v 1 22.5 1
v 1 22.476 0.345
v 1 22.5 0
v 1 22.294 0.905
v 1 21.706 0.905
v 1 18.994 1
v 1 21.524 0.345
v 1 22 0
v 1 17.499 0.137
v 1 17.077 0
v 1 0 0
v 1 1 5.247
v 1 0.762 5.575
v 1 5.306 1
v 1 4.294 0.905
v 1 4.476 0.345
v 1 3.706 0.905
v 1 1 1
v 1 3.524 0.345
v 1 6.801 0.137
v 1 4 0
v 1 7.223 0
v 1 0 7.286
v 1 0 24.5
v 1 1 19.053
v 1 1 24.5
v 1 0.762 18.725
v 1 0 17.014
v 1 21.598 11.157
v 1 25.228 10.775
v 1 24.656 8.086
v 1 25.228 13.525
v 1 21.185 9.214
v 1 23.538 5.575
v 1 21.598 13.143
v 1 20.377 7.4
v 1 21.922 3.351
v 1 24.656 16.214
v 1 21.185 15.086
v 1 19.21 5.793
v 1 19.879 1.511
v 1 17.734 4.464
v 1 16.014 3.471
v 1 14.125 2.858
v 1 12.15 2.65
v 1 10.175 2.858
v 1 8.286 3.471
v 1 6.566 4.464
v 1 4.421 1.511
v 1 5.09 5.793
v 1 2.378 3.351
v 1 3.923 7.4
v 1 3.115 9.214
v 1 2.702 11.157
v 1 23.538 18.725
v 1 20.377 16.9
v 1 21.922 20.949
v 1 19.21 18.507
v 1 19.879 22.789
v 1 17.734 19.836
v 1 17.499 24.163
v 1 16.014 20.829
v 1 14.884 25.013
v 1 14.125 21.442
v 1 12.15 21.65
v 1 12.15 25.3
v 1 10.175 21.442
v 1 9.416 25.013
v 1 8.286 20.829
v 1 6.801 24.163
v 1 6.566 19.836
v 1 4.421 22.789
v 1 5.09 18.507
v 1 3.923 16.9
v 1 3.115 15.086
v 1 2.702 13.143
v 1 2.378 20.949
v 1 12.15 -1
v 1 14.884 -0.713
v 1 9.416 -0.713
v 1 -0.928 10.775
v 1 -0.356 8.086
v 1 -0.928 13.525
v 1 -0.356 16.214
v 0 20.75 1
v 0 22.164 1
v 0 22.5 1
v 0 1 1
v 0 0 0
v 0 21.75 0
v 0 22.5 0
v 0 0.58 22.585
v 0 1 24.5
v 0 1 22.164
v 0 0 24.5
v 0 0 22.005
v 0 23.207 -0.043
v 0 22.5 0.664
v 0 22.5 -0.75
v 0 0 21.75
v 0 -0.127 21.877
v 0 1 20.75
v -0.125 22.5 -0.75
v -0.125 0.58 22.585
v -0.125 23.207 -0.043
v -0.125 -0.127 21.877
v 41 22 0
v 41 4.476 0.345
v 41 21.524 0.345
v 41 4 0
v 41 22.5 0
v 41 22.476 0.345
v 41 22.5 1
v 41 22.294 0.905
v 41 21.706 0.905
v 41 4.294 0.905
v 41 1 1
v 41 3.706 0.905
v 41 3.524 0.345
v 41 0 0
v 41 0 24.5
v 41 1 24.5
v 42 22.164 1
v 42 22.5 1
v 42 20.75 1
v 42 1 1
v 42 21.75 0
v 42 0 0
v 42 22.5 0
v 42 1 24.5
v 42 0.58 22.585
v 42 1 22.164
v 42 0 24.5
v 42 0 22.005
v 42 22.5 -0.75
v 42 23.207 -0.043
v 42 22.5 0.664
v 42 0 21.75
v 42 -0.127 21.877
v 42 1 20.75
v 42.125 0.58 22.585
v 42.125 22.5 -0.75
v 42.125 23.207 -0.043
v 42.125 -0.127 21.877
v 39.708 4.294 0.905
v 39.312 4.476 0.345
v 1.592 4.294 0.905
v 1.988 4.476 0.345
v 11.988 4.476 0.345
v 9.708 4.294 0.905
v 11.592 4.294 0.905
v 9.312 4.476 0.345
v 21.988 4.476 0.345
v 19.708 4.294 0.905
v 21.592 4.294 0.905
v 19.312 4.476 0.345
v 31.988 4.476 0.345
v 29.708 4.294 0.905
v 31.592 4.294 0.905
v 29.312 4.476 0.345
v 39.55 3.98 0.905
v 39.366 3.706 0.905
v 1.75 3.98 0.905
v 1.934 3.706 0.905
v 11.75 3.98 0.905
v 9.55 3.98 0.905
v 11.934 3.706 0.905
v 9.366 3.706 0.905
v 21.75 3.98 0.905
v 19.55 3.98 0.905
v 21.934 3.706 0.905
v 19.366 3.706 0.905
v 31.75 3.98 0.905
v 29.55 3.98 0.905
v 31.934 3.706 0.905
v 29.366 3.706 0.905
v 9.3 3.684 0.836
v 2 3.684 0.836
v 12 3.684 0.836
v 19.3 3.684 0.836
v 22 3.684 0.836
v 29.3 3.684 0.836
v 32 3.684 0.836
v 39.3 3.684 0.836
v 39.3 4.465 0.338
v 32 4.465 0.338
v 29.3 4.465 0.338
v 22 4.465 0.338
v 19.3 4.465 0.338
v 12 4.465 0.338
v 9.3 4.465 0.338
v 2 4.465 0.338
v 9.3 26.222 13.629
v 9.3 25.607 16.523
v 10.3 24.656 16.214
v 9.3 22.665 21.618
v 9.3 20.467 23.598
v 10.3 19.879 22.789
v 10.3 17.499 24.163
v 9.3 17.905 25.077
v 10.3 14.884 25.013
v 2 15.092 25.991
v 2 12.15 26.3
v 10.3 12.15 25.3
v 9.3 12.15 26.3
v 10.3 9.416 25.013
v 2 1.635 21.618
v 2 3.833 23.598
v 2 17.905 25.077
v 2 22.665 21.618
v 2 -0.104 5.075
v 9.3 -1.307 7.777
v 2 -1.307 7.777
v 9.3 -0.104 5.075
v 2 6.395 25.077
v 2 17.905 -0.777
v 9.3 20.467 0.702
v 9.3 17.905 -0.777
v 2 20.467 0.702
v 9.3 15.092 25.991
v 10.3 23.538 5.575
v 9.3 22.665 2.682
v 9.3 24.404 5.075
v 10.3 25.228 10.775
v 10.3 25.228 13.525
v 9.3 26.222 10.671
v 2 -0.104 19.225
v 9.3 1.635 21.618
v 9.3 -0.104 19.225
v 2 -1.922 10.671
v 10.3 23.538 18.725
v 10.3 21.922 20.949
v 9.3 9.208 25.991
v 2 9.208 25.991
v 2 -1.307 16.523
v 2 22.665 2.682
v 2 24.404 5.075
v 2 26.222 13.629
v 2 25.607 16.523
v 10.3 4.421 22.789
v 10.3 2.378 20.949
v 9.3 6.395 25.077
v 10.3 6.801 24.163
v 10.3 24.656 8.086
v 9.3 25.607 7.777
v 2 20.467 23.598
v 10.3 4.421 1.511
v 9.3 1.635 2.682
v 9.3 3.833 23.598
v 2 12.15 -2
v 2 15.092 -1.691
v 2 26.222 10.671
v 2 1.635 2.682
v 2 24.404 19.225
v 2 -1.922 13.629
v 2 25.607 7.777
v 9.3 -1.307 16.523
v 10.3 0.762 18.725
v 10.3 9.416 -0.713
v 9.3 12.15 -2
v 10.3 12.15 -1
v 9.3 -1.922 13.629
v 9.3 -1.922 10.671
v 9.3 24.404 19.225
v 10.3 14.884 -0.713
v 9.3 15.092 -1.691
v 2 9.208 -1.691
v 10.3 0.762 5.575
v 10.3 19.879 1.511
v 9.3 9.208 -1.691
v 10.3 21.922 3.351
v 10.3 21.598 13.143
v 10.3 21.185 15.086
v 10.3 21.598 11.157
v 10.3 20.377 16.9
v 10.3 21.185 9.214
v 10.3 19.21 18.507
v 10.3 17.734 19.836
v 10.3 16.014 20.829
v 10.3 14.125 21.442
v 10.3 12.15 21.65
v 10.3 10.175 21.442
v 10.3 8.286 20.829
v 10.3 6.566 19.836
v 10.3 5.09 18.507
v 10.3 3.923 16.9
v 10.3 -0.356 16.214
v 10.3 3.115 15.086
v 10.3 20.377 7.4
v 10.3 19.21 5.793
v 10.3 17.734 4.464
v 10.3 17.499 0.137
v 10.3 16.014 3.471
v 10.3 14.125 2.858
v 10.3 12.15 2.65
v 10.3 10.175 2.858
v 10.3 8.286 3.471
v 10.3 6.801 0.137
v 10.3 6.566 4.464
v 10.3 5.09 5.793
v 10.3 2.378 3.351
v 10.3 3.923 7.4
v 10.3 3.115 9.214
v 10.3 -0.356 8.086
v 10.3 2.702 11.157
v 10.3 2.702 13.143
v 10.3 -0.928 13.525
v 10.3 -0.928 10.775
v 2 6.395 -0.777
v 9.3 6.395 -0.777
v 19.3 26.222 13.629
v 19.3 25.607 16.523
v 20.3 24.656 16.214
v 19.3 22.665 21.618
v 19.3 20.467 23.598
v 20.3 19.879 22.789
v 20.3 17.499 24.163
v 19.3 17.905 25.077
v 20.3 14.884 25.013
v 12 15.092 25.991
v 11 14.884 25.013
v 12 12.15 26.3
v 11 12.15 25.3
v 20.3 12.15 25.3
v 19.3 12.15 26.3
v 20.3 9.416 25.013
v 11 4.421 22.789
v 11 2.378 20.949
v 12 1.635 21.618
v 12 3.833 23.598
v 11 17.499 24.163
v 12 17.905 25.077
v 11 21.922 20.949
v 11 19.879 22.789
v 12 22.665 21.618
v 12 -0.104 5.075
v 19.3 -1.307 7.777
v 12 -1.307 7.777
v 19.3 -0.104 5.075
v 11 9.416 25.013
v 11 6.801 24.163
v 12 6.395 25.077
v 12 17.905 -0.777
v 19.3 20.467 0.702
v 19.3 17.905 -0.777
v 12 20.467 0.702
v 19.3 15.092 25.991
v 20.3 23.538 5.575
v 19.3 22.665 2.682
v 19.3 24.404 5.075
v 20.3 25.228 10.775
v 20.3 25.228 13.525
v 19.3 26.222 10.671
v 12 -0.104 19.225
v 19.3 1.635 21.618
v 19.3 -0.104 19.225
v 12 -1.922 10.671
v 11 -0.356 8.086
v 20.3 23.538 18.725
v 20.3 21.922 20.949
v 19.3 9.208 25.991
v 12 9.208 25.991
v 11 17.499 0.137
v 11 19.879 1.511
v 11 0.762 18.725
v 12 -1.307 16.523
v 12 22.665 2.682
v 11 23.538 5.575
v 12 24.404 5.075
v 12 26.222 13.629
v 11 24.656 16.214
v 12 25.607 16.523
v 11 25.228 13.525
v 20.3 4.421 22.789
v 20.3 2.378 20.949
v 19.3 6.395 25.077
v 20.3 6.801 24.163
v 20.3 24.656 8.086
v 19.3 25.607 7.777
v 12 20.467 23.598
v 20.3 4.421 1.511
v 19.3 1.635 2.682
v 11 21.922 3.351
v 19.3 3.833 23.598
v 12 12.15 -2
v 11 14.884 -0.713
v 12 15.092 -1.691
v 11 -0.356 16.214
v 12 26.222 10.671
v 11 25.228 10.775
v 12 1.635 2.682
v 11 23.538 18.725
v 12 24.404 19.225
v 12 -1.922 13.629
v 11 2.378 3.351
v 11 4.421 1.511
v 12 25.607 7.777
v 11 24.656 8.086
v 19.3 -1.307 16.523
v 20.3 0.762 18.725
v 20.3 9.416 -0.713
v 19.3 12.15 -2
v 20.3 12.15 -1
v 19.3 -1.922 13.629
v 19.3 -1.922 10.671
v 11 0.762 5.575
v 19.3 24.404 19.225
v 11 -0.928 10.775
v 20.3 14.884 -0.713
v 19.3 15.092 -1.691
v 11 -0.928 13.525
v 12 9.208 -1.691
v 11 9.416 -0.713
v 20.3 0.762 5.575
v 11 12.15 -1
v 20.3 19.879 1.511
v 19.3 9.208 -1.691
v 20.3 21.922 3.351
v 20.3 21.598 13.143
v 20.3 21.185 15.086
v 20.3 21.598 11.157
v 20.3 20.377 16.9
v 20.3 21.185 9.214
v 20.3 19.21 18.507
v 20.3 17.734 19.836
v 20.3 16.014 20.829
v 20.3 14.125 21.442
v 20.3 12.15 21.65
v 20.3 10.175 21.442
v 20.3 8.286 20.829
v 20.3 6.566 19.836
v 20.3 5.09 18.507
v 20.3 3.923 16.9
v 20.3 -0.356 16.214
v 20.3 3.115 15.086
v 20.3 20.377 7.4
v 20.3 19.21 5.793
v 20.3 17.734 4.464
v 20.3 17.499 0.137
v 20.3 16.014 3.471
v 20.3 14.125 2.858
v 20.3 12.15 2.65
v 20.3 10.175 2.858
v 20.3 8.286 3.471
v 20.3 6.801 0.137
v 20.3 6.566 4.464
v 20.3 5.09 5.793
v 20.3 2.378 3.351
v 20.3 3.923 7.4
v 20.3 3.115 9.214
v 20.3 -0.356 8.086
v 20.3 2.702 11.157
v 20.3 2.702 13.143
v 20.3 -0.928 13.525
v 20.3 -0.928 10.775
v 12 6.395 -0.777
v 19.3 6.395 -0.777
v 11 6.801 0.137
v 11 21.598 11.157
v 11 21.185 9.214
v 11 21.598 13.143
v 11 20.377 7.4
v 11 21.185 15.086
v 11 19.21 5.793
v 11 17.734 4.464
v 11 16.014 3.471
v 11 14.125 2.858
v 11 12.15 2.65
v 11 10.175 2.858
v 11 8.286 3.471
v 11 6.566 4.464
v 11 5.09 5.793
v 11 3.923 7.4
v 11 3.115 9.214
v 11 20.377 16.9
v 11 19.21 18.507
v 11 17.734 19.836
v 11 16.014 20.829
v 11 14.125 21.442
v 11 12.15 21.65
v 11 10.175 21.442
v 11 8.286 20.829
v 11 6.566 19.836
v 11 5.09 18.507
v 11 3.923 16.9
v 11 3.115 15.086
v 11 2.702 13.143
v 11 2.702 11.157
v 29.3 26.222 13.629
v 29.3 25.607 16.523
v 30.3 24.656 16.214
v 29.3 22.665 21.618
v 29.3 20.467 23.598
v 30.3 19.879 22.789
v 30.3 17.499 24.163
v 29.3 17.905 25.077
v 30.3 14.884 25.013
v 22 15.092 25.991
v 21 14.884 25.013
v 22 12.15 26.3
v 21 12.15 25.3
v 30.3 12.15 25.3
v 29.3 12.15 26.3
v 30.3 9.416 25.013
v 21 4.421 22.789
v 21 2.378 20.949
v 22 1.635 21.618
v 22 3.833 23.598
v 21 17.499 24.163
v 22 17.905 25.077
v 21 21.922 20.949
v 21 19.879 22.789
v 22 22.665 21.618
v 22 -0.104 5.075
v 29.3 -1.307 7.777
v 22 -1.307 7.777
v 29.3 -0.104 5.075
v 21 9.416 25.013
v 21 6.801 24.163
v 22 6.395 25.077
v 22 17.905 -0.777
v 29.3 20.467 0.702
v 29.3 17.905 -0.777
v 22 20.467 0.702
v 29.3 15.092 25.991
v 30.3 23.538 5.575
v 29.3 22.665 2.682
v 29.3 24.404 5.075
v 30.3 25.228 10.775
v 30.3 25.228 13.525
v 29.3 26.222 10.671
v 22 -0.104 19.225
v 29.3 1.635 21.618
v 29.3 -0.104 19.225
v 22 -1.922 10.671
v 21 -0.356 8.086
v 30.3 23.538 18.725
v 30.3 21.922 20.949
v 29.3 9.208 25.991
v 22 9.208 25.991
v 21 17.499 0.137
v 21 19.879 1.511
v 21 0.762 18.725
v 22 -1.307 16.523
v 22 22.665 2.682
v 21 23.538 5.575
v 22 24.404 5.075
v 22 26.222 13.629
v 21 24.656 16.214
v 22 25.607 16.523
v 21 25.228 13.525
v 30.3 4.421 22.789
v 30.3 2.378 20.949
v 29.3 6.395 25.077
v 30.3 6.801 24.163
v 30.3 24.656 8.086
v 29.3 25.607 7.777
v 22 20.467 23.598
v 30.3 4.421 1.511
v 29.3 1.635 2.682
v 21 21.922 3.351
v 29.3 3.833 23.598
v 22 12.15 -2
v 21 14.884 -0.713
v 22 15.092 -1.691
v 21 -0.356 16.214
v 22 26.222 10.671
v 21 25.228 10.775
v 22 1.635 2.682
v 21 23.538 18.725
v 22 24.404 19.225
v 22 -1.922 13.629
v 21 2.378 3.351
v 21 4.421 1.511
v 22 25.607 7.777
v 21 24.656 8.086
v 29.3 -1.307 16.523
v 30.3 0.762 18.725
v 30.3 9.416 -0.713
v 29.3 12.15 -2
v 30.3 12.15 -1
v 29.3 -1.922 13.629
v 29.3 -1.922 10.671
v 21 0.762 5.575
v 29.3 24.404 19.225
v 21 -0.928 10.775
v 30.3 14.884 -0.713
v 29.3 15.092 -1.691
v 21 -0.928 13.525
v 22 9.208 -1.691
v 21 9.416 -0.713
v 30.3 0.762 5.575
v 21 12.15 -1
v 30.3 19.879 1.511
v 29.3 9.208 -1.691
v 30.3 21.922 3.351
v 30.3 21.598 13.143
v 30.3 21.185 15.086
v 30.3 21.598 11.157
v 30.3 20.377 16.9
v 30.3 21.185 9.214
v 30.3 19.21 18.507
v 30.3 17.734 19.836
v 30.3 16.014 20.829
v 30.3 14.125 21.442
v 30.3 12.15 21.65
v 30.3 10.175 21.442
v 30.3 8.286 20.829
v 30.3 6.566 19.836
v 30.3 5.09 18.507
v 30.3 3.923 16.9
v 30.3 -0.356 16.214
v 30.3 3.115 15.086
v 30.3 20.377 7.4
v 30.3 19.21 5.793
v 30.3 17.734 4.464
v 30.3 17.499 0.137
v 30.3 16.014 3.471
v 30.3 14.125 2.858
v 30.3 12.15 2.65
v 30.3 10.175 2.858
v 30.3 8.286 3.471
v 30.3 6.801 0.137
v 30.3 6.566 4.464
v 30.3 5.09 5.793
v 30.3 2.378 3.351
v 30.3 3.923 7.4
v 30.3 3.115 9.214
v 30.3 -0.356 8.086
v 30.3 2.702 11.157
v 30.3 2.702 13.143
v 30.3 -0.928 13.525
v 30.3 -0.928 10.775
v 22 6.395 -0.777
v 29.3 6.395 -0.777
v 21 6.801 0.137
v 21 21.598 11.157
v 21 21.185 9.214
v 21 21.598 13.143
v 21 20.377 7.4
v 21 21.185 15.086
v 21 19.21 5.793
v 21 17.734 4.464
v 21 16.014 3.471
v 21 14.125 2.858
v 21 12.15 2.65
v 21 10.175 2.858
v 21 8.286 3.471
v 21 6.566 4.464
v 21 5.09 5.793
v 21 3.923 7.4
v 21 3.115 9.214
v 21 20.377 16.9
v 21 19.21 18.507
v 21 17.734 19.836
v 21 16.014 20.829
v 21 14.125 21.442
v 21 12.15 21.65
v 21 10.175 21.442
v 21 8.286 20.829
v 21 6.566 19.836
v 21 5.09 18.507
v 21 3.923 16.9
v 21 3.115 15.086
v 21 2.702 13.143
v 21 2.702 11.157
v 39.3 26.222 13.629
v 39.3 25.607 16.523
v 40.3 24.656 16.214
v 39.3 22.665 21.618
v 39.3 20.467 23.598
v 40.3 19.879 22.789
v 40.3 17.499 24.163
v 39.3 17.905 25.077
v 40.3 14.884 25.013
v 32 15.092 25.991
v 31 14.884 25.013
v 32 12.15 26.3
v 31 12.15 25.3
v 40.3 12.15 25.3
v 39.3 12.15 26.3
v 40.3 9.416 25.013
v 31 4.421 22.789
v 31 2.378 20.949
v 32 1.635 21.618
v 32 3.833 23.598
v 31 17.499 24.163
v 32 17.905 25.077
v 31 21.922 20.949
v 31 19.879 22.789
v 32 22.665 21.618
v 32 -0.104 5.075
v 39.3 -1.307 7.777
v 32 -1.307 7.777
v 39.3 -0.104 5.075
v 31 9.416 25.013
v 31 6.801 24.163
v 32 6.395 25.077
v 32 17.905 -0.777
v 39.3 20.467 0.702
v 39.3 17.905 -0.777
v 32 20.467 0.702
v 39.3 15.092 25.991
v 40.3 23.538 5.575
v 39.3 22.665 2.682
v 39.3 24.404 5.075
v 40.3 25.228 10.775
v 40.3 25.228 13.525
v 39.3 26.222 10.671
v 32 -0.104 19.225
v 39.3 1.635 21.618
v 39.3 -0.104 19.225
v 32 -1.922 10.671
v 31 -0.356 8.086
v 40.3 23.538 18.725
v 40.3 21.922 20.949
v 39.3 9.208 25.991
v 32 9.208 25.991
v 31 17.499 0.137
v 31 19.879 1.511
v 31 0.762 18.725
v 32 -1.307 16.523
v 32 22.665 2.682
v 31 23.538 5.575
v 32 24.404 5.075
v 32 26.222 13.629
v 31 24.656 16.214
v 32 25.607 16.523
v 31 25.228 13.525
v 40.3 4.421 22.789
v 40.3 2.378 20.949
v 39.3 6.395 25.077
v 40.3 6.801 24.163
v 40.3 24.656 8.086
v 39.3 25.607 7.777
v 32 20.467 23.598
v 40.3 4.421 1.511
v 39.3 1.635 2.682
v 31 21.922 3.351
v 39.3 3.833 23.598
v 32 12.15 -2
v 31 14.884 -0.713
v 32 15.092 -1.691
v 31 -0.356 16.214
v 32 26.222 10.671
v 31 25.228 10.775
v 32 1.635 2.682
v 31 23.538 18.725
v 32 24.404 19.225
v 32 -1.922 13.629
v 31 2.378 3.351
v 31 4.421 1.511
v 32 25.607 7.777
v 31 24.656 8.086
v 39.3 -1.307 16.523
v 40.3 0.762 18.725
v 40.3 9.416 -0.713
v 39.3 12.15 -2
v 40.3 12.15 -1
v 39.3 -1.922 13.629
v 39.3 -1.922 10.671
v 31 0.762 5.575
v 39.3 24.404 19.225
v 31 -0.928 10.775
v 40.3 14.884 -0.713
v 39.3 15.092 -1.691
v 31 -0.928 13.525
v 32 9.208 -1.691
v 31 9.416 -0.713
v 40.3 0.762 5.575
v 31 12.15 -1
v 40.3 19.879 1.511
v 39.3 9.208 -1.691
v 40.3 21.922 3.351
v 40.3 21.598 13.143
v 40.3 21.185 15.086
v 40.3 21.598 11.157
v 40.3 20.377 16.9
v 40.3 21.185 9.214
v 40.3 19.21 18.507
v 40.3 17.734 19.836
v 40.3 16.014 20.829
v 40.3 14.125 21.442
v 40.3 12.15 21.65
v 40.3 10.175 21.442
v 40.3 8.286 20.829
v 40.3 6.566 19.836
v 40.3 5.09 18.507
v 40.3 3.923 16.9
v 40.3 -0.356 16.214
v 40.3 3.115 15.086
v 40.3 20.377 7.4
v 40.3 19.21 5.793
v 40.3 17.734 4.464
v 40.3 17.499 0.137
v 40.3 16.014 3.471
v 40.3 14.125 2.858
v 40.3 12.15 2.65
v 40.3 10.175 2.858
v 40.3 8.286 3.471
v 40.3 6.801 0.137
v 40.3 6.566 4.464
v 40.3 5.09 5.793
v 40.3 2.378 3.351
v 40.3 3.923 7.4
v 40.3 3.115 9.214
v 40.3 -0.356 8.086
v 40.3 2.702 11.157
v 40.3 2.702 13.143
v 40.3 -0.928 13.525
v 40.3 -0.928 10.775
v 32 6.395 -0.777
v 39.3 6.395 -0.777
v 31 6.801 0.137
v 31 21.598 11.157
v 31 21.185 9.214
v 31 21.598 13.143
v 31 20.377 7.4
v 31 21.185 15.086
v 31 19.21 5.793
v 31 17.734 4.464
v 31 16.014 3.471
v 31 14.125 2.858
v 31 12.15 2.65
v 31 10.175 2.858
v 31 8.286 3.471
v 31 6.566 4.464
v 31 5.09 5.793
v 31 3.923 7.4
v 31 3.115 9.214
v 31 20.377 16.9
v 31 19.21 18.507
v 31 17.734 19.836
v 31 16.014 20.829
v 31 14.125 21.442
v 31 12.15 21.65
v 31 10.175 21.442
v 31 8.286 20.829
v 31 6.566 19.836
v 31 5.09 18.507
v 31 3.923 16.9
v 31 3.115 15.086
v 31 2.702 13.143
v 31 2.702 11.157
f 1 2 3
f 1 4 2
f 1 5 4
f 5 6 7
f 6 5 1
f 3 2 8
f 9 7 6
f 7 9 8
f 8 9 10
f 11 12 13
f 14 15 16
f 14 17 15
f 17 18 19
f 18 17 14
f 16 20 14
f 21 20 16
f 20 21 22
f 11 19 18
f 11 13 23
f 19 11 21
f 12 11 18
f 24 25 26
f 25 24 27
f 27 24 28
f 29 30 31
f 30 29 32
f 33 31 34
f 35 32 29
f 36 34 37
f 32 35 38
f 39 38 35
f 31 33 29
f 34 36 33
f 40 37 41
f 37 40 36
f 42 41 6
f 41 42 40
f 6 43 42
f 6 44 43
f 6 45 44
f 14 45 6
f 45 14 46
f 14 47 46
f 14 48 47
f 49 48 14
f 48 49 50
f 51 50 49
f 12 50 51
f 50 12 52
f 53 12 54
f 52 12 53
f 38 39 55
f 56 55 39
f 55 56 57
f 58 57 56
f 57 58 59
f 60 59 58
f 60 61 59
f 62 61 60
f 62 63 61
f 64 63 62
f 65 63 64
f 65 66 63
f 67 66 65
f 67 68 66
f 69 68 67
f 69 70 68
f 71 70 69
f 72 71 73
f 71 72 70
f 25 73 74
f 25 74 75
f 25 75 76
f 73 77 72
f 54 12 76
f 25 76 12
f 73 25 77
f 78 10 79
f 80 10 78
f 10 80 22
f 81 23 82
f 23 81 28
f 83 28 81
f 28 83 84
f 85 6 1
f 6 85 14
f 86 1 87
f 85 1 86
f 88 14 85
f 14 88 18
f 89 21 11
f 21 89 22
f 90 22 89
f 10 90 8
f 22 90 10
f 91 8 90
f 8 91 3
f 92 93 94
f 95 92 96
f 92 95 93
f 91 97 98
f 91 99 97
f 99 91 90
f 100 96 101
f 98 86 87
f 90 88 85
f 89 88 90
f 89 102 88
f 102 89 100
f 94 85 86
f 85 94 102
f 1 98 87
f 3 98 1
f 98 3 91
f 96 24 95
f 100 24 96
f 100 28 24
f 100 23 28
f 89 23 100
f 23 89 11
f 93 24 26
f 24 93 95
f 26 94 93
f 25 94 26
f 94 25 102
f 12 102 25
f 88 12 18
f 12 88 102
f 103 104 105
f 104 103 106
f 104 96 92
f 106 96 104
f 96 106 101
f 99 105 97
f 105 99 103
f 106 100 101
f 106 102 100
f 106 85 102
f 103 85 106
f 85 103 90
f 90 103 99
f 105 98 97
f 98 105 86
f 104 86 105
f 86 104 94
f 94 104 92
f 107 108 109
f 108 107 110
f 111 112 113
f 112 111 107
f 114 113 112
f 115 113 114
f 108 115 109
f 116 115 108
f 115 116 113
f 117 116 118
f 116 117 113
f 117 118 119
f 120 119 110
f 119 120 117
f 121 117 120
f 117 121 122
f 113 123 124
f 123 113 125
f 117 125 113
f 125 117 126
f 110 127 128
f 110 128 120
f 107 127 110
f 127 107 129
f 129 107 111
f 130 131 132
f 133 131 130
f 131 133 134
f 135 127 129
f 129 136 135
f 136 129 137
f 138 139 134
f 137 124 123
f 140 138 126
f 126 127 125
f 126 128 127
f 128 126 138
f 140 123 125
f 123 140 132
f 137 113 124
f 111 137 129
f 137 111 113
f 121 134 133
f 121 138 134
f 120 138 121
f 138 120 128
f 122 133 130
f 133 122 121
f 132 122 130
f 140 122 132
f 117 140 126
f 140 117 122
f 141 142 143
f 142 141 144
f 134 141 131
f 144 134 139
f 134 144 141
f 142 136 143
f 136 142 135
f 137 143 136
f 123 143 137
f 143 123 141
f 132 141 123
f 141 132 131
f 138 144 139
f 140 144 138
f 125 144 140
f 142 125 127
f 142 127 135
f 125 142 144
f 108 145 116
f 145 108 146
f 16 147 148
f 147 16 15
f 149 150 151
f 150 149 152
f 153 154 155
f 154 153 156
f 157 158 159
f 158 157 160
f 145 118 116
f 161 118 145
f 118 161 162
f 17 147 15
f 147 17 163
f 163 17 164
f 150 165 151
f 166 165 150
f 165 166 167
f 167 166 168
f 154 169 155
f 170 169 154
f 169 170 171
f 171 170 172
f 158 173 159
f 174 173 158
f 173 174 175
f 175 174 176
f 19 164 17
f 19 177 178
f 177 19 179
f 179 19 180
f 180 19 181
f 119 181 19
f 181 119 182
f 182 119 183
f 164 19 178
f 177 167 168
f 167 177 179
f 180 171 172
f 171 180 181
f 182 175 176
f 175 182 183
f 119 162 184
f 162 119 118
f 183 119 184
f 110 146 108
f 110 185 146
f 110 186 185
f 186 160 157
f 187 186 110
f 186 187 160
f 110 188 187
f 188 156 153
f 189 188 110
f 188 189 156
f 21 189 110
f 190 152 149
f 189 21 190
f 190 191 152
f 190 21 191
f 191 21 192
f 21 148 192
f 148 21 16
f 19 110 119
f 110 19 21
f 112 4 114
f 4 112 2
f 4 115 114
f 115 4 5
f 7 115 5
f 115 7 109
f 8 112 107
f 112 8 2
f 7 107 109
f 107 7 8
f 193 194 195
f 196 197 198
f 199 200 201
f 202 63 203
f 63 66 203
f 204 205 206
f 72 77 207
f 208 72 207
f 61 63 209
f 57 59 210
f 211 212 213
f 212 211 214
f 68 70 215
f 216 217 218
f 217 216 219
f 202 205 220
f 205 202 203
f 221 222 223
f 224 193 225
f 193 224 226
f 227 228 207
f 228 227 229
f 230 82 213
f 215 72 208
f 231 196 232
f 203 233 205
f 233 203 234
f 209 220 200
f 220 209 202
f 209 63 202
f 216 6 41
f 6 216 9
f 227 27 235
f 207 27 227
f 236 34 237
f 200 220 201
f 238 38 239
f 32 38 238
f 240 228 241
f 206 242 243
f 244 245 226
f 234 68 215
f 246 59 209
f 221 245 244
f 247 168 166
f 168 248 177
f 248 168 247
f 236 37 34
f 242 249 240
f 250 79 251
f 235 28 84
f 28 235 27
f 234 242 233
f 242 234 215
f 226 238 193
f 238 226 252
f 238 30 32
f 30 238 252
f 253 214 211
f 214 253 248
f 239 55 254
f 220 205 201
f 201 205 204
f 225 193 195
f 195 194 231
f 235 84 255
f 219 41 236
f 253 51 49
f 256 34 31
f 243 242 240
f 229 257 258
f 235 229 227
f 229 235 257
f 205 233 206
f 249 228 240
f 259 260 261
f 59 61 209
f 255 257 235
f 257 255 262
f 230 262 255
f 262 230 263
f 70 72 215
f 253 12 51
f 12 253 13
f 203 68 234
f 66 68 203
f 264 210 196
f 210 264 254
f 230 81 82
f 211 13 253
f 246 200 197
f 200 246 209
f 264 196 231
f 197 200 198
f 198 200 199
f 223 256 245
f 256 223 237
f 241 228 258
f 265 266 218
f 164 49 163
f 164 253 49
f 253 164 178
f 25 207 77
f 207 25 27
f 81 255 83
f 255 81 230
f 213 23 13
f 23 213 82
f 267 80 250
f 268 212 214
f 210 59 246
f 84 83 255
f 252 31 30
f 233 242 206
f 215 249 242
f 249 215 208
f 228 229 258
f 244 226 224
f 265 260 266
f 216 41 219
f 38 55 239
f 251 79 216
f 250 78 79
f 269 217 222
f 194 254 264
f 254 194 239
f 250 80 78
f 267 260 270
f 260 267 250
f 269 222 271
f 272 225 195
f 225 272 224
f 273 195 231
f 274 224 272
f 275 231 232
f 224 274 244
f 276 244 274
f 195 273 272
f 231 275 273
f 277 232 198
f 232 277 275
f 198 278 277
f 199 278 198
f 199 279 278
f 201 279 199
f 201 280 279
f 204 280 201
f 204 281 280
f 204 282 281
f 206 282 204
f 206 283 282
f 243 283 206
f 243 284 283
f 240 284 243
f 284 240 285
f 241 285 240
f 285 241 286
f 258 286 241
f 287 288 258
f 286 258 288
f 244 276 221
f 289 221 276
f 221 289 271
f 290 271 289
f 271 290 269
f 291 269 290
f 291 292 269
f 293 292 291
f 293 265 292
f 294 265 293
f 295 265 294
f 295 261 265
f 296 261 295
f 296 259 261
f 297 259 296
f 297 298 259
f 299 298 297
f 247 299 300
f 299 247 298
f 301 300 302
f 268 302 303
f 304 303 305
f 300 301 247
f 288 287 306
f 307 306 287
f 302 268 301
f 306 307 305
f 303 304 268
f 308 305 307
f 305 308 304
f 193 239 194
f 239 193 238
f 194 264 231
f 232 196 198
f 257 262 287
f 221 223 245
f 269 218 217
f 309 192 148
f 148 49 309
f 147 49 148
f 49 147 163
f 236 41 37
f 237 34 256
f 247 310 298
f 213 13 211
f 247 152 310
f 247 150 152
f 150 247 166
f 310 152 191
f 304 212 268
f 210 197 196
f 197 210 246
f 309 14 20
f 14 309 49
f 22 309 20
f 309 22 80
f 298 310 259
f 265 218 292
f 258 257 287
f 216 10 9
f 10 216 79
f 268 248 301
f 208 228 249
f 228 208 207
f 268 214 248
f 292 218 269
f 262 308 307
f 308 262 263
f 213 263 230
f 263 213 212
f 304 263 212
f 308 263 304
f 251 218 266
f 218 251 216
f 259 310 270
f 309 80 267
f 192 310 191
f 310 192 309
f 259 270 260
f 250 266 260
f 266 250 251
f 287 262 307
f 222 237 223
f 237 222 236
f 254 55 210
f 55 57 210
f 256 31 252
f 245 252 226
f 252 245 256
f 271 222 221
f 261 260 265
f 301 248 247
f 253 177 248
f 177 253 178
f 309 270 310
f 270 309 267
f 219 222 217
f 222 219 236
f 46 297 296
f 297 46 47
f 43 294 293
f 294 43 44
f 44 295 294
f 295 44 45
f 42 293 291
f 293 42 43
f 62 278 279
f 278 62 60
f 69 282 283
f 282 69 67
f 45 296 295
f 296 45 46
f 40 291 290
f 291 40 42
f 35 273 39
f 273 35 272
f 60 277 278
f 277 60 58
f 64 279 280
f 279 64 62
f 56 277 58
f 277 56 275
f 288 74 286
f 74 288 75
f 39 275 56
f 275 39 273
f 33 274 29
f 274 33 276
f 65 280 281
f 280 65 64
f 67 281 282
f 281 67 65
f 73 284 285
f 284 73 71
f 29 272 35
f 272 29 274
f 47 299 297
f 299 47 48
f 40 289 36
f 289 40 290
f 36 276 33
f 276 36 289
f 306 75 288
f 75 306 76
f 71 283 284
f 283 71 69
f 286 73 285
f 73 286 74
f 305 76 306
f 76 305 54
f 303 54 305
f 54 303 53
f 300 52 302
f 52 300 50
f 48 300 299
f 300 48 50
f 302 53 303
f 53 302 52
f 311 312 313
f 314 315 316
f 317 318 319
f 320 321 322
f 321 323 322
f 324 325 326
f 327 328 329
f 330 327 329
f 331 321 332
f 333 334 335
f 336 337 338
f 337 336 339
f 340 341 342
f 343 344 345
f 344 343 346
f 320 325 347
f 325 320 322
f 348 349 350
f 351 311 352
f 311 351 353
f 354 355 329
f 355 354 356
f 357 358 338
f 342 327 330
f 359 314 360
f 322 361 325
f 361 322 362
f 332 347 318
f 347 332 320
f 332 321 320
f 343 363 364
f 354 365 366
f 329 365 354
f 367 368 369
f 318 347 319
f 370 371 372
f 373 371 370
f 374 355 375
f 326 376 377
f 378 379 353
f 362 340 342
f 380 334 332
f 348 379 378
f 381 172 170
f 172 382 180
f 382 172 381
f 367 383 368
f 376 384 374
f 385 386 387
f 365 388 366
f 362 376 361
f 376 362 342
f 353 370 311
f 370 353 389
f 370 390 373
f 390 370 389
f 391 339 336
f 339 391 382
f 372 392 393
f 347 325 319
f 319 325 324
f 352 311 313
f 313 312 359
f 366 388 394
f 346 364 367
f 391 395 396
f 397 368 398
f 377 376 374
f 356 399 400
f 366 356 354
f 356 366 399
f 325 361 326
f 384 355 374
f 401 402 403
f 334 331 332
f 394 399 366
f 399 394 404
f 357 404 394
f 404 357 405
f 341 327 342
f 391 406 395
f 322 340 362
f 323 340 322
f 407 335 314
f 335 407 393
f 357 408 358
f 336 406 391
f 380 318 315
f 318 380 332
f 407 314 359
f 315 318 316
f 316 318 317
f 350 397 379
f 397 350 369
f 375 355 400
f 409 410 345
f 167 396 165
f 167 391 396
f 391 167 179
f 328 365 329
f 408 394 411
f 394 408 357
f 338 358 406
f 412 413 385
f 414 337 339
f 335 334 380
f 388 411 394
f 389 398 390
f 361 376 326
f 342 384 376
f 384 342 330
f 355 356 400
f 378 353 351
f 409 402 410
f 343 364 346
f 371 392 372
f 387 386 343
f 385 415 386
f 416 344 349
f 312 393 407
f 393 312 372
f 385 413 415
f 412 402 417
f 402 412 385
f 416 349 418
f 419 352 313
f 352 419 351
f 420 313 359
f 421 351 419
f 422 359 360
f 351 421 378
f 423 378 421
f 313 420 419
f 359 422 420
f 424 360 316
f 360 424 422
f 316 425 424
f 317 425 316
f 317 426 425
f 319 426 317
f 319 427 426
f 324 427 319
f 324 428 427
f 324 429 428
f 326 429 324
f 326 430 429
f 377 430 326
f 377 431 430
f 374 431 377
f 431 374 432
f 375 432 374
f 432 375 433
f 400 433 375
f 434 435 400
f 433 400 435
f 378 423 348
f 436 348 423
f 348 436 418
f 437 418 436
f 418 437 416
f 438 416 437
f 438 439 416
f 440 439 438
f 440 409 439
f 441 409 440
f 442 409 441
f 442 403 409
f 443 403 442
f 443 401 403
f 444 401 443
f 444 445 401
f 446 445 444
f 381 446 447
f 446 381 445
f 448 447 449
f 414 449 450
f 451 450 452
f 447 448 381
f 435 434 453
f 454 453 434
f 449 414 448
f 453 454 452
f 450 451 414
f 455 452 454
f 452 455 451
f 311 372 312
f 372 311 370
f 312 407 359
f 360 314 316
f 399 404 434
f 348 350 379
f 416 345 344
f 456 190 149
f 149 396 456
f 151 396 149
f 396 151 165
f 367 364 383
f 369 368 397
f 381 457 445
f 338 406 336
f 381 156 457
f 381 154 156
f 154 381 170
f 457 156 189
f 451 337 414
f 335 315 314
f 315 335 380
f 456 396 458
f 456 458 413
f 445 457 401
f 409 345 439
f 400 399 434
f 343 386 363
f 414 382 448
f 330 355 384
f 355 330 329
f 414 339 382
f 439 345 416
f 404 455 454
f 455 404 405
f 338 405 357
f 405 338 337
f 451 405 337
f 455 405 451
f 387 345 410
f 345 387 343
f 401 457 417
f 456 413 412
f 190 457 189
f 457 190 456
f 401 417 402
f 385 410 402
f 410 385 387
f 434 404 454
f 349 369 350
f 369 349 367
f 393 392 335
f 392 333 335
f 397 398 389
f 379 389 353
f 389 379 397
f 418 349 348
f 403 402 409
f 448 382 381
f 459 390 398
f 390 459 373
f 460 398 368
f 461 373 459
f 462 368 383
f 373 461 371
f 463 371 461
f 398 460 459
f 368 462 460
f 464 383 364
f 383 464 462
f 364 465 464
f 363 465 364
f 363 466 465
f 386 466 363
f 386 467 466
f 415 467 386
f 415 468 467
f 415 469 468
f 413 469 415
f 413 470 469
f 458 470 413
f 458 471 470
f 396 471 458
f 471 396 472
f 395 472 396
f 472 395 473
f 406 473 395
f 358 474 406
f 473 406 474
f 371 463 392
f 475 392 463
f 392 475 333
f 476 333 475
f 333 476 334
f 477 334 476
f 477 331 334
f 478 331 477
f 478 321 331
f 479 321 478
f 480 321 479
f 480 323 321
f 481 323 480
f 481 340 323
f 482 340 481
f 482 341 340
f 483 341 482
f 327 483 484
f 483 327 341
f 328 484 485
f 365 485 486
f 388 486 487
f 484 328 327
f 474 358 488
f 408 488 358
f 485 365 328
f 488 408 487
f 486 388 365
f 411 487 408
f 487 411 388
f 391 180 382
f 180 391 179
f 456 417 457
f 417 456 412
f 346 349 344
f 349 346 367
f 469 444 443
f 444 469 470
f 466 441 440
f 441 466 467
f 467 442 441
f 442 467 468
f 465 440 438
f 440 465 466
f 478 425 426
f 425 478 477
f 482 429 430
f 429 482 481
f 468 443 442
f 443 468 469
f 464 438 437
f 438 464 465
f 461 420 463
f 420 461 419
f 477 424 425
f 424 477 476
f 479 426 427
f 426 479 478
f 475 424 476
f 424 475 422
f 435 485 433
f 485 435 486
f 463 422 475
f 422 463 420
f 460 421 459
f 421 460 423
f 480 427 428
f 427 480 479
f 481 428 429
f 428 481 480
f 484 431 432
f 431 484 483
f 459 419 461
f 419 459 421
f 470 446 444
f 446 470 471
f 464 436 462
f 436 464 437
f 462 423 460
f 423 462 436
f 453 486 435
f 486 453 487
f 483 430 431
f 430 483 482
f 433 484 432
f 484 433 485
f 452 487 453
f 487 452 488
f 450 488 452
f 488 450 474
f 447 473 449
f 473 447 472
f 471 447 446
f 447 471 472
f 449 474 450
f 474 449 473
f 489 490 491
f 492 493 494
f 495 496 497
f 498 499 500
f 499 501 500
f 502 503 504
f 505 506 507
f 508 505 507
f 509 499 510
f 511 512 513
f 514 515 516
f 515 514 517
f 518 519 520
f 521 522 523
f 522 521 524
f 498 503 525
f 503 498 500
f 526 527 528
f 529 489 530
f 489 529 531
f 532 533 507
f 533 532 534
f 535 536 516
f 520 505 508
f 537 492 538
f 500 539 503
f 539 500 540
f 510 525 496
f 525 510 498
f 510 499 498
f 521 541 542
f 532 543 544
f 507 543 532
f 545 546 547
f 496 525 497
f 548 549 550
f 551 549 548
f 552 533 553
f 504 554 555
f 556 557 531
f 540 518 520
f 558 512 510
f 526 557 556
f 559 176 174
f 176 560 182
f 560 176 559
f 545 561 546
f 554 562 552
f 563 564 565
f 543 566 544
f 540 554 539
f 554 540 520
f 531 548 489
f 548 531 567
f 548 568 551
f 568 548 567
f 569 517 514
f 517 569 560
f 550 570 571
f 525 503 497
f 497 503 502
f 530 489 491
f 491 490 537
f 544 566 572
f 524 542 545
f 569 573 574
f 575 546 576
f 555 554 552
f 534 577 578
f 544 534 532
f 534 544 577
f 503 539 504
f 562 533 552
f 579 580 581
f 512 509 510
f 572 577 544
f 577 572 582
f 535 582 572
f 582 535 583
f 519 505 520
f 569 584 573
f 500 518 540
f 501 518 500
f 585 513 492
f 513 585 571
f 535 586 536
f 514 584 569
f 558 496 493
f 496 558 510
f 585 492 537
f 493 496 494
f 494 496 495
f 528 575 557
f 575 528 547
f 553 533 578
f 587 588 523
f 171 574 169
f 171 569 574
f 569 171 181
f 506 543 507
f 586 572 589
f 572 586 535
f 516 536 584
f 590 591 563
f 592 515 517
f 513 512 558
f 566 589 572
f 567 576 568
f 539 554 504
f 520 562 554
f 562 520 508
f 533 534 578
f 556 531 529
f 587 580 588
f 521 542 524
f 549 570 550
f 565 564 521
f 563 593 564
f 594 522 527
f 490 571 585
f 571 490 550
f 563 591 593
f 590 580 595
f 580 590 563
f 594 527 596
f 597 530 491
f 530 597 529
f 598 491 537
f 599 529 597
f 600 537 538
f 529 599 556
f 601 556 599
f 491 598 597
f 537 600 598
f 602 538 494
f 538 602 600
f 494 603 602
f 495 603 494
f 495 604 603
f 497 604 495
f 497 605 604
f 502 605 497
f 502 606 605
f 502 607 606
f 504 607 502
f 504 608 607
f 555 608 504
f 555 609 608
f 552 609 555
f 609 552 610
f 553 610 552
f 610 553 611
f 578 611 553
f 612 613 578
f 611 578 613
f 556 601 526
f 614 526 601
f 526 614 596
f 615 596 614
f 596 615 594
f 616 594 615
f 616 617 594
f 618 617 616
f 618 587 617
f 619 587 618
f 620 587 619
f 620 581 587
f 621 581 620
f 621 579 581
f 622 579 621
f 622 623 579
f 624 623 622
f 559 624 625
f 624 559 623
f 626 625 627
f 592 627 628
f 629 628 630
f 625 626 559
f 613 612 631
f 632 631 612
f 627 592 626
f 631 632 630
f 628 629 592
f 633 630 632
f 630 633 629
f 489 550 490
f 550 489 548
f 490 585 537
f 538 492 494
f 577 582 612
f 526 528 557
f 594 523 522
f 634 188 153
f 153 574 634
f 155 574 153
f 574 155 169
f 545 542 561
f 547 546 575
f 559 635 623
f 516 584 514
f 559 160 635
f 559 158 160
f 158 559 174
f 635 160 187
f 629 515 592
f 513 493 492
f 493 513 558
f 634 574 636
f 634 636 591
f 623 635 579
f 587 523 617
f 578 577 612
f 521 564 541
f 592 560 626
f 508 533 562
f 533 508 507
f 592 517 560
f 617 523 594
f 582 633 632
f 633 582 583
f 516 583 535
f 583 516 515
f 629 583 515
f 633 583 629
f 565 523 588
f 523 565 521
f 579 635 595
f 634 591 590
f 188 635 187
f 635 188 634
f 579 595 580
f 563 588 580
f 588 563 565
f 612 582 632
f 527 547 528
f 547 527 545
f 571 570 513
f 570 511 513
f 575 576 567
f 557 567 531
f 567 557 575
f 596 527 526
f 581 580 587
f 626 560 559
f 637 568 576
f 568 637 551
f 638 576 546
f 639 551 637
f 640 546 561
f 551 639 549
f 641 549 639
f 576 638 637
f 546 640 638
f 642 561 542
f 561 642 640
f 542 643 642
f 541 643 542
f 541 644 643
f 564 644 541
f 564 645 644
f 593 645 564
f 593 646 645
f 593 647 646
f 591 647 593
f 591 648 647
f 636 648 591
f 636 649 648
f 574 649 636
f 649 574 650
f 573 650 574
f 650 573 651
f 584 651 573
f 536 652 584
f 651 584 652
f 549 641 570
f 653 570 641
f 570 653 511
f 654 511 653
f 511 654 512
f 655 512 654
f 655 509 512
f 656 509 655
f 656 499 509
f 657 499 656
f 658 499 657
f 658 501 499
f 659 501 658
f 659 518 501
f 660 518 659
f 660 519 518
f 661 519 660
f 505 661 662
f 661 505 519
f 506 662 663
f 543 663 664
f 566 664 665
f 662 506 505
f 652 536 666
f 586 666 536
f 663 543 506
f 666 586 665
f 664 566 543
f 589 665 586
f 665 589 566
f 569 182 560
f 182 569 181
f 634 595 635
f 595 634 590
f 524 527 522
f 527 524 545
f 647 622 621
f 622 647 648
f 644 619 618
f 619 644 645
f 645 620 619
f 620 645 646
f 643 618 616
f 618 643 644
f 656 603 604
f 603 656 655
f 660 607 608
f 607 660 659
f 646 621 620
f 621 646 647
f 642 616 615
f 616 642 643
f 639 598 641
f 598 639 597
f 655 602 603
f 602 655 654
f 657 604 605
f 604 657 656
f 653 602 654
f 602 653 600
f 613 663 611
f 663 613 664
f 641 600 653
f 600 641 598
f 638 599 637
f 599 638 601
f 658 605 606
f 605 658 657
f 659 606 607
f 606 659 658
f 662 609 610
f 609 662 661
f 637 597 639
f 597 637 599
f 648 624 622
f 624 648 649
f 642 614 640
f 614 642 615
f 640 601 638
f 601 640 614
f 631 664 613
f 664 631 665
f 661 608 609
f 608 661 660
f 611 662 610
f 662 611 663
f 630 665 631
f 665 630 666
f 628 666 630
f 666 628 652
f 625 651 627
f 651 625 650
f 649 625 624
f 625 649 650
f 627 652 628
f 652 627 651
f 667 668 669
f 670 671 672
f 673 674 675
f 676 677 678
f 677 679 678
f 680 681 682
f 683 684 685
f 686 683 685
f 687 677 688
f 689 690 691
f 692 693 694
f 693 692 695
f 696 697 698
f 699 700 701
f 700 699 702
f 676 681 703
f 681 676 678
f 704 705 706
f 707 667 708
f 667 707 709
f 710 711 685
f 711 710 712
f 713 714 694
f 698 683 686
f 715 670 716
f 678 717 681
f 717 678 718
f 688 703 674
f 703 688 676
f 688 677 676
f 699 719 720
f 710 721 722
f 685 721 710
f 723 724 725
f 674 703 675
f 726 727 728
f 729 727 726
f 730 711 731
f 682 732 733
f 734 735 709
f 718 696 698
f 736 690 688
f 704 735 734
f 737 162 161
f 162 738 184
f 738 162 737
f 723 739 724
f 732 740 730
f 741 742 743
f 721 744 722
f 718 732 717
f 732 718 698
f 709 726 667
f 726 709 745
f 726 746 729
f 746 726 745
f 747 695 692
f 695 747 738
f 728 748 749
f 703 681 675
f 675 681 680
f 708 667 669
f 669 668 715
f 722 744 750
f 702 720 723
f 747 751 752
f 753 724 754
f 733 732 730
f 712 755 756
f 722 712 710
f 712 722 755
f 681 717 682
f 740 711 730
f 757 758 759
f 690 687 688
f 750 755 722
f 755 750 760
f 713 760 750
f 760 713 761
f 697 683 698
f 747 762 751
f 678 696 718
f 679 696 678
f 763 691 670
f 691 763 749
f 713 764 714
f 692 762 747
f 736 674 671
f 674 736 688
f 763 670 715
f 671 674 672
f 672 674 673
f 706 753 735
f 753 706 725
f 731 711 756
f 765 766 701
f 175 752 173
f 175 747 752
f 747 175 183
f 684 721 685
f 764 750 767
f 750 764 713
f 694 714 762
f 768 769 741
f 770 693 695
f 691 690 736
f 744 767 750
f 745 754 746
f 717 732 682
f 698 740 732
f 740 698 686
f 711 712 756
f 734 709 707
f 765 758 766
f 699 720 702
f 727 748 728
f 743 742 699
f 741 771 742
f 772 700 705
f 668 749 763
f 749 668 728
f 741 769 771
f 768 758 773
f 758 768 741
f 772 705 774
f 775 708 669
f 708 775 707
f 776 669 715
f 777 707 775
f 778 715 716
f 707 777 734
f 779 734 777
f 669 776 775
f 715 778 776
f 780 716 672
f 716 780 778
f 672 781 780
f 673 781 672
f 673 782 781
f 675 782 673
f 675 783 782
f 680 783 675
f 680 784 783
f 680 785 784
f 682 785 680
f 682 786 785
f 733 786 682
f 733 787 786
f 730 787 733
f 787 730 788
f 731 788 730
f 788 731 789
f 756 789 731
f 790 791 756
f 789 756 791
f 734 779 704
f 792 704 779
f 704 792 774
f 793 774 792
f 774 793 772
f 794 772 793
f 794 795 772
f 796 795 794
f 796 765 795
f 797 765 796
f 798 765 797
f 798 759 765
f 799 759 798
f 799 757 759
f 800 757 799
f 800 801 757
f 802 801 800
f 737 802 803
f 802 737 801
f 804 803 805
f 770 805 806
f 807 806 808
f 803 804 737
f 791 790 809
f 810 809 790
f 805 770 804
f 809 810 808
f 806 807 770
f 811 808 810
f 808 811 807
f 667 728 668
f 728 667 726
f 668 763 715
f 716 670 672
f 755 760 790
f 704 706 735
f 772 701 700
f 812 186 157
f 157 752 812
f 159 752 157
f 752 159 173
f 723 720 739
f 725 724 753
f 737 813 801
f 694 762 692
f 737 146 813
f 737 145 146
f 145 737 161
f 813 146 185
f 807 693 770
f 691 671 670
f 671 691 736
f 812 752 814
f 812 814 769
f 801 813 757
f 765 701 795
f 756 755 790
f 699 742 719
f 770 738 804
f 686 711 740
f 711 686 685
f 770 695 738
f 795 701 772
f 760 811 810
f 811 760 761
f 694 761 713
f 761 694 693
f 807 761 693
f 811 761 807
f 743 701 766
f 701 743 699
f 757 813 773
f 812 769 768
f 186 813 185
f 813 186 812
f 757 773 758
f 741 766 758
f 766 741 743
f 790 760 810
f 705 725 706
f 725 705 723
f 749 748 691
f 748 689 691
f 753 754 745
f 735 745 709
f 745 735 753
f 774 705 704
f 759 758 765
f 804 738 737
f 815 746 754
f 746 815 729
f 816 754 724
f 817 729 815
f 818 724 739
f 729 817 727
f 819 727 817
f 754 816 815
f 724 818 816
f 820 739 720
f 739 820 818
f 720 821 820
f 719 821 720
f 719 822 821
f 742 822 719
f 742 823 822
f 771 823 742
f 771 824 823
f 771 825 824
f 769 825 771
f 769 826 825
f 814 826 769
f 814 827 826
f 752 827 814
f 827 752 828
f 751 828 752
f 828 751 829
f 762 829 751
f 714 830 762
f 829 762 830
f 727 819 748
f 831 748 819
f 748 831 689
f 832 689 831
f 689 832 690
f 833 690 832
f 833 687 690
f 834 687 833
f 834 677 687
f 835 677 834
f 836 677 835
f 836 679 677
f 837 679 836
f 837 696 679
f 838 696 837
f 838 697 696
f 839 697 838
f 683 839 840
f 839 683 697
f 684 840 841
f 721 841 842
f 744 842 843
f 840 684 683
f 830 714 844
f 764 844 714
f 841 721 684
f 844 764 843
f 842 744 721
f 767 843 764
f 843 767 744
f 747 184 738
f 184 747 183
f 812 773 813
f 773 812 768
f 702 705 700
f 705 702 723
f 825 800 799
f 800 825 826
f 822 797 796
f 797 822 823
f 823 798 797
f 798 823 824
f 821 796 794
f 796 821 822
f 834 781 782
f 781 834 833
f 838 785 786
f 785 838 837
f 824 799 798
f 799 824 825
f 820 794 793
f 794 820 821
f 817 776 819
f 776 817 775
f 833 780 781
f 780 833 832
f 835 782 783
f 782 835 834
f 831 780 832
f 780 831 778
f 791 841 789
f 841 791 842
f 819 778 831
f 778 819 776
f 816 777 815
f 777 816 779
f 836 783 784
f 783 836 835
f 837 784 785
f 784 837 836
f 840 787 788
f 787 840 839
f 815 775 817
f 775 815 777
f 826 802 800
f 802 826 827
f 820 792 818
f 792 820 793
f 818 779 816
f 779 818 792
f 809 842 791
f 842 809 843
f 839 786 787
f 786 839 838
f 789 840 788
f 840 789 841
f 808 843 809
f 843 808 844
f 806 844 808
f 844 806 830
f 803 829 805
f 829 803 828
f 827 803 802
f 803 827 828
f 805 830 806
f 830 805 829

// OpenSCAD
// HyLoft 01031 Folding Storage TireLoft,

module rounded_cylinder(r, h, n) {
  rotate_extrude(convexity=1) {
    offset(r=n) offset(delta=-n) square([r,h]);
    square([n,h]);
  }
}

module tire(dia, w, iw) {
    difference() {
        rounded_cylinder(dia/2, w, 1);
        cylinder(r=(iw/2), h=w);
    }
}

module loft_end() {
    cube([1, 22.5, 1]);
    cube([1, 1, 24.5]);
    
    translate([-0.125, 22.5, -0.75])
    rotate([45, 0, 0])
    cube([0.125, 1, 32]);
}

module tire_loft() {
    color("silver") {
        loft_end();
        
        translate([0, 4, 0.5])
        rotate([0, 90, 0])
        cylinder(d=1, h=42);

        translate([0, 22, 0.5])
        rotate([0, 90, 0])
        cylinder(d=1, h=42);
        
        translate([42, 0, 0])
        mirror([1, 0, 0])
        loft_end();
    }

    // tires
    for(i=[0:10:30]) {
        let(dr=2) {
            translate([i + 1, (28.3/2)-dr, (28.3/2)-dr])
            rotate([0, 90])
            color("black")
            tire(28.3, 9.3, 19);
        }
    }
}

tire_loft();
